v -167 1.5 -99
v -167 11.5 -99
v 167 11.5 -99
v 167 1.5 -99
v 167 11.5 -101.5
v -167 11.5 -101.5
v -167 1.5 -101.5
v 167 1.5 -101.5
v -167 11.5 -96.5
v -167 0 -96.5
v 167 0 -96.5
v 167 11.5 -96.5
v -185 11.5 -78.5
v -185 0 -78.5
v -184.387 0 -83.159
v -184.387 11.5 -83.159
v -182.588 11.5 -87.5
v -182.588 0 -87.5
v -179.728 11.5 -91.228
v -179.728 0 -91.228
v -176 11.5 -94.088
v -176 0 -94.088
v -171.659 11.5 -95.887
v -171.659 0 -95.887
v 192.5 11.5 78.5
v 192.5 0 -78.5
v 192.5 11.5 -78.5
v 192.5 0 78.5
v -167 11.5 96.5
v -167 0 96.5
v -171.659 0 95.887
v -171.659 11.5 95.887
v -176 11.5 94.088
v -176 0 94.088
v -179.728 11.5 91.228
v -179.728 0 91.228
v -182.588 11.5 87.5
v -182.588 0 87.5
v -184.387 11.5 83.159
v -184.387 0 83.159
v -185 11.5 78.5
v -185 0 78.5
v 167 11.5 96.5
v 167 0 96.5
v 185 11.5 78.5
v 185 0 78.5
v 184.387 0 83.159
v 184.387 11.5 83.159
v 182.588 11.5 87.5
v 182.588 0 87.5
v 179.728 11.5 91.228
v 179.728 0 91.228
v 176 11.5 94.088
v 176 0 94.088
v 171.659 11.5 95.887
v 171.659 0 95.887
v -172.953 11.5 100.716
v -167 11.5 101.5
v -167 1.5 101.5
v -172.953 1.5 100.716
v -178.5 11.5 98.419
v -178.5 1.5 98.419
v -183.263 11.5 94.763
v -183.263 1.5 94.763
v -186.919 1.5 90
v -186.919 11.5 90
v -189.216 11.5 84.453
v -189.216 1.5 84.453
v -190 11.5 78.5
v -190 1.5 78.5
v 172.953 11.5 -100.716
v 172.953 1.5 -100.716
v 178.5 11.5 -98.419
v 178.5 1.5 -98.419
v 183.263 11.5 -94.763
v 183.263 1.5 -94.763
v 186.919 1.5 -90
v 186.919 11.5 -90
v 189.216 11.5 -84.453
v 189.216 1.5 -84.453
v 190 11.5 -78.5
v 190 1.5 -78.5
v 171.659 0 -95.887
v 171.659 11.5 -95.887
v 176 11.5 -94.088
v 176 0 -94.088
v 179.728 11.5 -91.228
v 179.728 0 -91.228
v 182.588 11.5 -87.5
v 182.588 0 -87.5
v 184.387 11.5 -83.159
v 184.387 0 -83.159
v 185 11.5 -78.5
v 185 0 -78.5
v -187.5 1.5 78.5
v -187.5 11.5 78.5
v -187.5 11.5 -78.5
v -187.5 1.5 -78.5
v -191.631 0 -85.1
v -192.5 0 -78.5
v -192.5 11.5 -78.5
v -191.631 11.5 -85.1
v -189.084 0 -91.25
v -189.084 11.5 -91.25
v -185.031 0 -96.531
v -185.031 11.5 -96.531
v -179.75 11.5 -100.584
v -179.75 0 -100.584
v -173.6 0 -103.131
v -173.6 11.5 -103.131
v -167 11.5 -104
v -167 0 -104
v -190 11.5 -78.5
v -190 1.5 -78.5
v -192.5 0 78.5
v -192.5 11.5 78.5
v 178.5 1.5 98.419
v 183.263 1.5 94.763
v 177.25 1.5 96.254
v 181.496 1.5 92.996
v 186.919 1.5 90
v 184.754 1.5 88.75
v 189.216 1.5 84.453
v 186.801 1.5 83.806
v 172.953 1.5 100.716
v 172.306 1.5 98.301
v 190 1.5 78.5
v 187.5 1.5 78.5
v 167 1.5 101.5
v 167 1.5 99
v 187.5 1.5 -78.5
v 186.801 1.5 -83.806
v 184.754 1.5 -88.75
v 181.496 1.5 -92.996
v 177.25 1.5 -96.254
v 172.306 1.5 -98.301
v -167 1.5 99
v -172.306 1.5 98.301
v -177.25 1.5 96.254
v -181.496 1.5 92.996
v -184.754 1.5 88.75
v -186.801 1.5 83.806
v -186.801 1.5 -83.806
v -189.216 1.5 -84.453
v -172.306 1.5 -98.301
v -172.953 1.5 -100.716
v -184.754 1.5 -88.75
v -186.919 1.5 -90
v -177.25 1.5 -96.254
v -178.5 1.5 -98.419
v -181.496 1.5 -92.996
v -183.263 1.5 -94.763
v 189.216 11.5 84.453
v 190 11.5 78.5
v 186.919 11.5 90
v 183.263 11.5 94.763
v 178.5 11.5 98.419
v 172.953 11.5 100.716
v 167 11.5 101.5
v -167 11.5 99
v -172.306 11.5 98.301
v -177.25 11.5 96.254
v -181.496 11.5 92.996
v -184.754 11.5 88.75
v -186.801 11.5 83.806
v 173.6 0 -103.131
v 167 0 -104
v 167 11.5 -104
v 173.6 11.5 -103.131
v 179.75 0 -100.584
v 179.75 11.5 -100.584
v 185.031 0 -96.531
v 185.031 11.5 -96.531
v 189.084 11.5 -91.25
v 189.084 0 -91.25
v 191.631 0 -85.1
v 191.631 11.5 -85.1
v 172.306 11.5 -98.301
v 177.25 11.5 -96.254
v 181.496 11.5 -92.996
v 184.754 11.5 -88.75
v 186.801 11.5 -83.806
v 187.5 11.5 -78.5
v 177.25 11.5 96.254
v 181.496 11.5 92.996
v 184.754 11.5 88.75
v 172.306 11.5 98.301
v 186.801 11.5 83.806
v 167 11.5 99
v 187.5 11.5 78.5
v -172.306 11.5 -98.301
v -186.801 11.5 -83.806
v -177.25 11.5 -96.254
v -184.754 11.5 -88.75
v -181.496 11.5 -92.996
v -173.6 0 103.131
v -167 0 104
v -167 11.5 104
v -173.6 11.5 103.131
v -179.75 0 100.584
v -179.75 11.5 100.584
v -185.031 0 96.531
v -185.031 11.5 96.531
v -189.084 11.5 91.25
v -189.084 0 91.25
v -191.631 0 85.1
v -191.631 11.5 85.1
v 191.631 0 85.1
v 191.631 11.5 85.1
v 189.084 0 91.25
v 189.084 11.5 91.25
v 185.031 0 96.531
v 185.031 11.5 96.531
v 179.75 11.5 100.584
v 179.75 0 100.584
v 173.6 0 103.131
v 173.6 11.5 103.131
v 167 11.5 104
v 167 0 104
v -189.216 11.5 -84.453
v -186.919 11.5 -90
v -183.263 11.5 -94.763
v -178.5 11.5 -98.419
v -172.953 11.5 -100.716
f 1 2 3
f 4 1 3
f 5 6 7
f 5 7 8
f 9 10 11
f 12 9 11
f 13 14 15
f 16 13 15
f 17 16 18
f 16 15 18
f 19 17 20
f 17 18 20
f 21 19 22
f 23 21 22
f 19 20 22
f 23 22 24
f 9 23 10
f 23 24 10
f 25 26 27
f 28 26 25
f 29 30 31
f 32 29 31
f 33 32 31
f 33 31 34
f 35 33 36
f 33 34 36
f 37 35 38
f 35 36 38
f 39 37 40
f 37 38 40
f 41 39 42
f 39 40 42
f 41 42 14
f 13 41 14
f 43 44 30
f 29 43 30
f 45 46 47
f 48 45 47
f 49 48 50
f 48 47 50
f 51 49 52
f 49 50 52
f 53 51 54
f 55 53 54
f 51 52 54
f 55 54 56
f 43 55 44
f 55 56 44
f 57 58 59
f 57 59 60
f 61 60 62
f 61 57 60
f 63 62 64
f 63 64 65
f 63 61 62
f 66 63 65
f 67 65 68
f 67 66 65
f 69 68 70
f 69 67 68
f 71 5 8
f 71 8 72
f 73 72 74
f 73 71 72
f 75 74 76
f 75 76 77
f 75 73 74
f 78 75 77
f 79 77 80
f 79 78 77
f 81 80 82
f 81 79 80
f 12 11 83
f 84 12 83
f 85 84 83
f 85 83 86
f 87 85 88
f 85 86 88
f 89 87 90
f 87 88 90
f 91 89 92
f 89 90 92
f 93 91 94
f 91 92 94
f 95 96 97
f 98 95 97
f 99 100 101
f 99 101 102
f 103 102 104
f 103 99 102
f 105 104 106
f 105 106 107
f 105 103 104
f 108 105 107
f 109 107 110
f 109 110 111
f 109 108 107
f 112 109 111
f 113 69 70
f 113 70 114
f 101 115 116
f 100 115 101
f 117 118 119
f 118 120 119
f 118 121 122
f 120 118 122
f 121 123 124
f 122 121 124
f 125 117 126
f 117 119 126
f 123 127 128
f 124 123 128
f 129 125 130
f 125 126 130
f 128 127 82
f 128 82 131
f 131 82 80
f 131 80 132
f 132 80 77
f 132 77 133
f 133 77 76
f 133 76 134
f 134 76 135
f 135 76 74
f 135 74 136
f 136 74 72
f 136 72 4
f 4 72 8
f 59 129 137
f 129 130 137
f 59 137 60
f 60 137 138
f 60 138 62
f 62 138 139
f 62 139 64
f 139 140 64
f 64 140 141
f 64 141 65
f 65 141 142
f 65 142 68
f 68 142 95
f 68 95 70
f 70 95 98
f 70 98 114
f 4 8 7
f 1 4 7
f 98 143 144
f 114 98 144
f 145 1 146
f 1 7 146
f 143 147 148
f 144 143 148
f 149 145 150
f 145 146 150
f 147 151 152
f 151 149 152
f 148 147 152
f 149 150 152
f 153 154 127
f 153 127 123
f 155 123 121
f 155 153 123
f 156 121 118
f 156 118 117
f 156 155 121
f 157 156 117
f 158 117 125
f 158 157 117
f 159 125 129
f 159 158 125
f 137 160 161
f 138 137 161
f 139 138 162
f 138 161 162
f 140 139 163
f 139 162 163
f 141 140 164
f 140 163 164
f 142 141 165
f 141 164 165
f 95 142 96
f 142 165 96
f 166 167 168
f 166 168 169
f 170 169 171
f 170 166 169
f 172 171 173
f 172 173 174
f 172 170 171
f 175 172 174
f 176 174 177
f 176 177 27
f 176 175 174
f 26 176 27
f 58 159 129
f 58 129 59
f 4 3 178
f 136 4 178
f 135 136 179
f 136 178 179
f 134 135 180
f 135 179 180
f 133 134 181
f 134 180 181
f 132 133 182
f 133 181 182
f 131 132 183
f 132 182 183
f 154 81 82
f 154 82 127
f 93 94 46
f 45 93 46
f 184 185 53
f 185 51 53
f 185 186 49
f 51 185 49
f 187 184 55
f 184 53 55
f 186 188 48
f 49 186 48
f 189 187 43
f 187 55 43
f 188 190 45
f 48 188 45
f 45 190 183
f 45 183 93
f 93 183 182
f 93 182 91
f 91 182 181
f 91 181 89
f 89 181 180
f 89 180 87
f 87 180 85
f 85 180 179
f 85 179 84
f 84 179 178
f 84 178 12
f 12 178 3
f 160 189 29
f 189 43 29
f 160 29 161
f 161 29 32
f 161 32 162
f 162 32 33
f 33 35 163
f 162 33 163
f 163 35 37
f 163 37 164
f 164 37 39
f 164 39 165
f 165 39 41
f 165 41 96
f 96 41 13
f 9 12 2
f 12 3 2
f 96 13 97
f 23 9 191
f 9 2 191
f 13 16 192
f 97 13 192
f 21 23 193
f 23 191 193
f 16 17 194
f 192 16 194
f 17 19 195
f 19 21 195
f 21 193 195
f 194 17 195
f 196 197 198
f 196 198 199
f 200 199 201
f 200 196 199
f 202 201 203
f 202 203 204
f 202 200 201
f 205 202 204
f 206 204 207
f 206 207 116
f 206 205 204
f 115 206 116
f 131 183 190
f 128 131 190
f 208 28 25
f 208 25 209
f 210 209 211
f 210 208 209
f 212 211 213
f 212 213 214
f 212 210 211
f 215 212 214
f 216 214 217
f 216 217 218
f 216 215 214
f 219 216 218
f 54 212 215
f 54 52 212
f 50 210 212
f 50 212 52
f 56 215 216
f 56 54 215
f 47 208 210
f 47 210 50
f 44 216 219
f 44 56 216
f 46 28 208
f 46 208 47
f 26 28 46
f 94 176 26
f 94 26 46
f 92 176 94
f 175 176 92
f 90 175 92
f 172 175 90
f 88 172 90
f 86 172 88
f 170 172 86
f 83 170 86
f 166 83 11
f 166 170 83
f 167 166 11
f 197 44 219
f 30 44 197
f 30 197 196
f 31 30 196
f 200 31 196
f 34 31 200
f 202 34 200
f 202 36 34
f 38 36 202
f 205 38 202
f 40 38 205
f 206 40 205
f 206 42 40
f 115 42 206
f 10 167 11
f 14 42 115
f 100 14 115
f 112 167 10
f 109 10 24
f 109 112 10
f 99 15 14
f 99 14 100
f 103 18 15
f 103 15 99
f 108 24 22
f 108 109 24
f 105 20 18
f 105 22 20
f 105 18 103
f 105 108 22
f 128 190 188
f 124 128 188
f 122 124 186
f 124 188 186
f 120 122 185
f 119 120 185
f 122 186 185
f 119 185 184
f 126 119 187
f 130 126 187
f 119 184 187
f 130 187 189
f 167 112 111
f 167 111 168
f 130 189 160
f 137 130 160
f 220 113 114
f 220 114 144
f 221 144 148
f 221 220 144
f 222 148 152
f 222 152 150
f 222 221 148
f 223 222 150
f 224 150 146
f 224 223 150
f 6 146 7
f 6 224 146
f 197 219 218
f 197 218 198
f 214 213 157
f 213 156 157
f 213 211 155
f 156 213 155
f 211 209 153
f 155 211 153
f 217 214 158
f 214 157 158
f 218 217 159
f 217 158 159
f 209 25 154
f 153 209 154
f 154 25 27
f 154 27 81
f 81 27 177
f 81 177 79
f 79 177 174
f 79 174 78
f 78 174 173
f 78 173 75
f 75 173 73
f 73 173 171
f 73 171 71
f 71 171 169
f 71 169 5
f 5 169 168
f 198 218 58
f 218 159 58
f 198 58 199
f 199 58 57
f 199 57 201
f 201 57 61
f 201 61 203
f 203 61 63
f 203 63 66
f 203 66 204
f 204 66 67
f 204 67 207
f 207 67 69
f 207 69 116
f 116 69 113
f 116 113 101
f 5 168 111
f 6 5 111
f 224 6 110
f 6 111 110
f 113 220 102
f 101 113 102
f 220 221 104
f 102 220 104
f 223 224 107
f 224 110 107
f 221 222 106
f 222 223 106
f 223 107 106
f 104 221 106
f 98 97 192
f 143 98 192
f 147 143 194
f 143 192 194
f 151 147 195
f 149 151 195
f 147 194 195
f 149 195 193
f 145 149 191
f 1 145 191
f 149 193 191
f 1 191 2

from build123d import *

# Parameters (mm, degrees)
EXTRUDE_1_DEPTH          = 11.5
CUT_EXTRUDE_1_DEPTH      = 220.099292559
CUT_EXTRUDE_1_DEPTH_BACK = 220.099292559
CUT_EXTRUDE_3_DEPTH      = 10


with BuildPart() as part:
    # 草图2 → 凸台-拉伸1 (new body)
    with BuildSketch(Plane(origin=(0, 0, 0), x_dir=(1, 0, 0), z_dir=(0, 1, 0))):
        with BuildLine():
            Line((-167, 104), (167, 104))
            ThreePointArc((167, 104), (185.03122292, 96.53122292), (192.5, 78.5))
            Line((192.5, 78.5), (192.5, -78.5))
            ThreePointArc((192.5, -78.5), (185.03122292, -96.53122292), (167, -104))
            Line((167, -104), (-167, -104))
            ThreePointArc((-167, -104), (-185.03122292, -96.53122292), (-192.5, -78.5))
            Line((-192.5, -78.5), (-192.5, 78.5))
            ThreePointArc((-192.5, 78.5), (-185.03122292, 96.53122292), (-167, 104))
        make_face()
    extrude(amount=EXTRUDE_1_DEPTH)

    # 草图3 → 切除-拉伸1 (cut, two sides: drawn at the far end of the back side and taken through both)
    with BuildSketch(Plane(origin=(0, 11.5, 0), x_dir=(1, 0, 0), z_dir=(0, 1, 0)).offset(-CUT_EXTRUDE_1_DEPTH_BACK)):
        with BuildLine():
            Line((-167, 96.5), (167, 96.5))
            ThreePointArc((167, 96.5), (179.727922061, 91.227922061), (185, 78.5))
            Line((185, 78.5), (185, -78.5))
            ThreePointArc((185, -78.5), (179.727922061, -91.227922061), (167, -96.5))
            Line((167, -96.5), (-167, -96.5))
            ThreePointArc((-167, -96.5), (-179.727922061, -91.227922061), (-185, -78.5))
            Line((-185, -78.5), (-185, 78.5))
            ThreePointArc((-185, 78.5), (-179.727922061, 91.227922061), (-167, 96.5))
        make_face()
    extrude(amount=CUT_EXTRUDE_1_DEPTH + CUT_EXTRUDE_1_DEPTH_BACK, mode=Mode.SUBTRACT)

    # 草图6 → 切除-拉伸3 (cut)
    with BuildSketch(Plane(origin=(0, 11.5, 0), x_dir=(1, 0, 0), z_dir=(0, 1, 0))):
        with BuildLine():
            Line((-167, 101.5), (167, 101.5))
            ThreePointArc((167, 101.5), (183.263455967, 94.763455967), (190, 78.5))
            Line((190, 78.5), (190, -78.5))
            ThreePointArc((190, -78.5), (183.263455967, -94.763455967), (167, -101.5))
            Line((167, -101.5), (-167, -101.5))
            ThreePointArc((-167, -101.5), (-183.263455967, -94.763455967), (-190, -78.5))
            Line((-190, -78.5), (-190, 78.5))
            ThreePointArc((-190, 78.5), (-183.263455967, 94.763455967), (-167, 101.5))
        make_face()
        with BuildLine():
            Line((-167, 99), (167, 99))
            ThreePointArc((167, 99), (181.495689014, 92.995689014), (187.5, 78.5))
            Line((187.5, 78.5), (187.5, -78.5))
            ThreePointArc((187.5, -78.5), (181.495689014, -92.995689014), (167, -99))
            Line((167, -99), (-167, -99))
            ThreePointArc((-167, -99), (-181.495689014, -92.995689014), (-187.5, -78.5))
            Line((-187.5, -78.5), (-187.5, 78.5))
            ThreePointArc((-187.5, 78.5), (-181.495689014, 92.995689014), (-167, 99))
        make_face(mode=Mode.SUBTRACT)
    extrude(amount=-CUT_EXTRUDE_3_DEPTH, mode=Mode.SUBTRACT)


solid = part.part
